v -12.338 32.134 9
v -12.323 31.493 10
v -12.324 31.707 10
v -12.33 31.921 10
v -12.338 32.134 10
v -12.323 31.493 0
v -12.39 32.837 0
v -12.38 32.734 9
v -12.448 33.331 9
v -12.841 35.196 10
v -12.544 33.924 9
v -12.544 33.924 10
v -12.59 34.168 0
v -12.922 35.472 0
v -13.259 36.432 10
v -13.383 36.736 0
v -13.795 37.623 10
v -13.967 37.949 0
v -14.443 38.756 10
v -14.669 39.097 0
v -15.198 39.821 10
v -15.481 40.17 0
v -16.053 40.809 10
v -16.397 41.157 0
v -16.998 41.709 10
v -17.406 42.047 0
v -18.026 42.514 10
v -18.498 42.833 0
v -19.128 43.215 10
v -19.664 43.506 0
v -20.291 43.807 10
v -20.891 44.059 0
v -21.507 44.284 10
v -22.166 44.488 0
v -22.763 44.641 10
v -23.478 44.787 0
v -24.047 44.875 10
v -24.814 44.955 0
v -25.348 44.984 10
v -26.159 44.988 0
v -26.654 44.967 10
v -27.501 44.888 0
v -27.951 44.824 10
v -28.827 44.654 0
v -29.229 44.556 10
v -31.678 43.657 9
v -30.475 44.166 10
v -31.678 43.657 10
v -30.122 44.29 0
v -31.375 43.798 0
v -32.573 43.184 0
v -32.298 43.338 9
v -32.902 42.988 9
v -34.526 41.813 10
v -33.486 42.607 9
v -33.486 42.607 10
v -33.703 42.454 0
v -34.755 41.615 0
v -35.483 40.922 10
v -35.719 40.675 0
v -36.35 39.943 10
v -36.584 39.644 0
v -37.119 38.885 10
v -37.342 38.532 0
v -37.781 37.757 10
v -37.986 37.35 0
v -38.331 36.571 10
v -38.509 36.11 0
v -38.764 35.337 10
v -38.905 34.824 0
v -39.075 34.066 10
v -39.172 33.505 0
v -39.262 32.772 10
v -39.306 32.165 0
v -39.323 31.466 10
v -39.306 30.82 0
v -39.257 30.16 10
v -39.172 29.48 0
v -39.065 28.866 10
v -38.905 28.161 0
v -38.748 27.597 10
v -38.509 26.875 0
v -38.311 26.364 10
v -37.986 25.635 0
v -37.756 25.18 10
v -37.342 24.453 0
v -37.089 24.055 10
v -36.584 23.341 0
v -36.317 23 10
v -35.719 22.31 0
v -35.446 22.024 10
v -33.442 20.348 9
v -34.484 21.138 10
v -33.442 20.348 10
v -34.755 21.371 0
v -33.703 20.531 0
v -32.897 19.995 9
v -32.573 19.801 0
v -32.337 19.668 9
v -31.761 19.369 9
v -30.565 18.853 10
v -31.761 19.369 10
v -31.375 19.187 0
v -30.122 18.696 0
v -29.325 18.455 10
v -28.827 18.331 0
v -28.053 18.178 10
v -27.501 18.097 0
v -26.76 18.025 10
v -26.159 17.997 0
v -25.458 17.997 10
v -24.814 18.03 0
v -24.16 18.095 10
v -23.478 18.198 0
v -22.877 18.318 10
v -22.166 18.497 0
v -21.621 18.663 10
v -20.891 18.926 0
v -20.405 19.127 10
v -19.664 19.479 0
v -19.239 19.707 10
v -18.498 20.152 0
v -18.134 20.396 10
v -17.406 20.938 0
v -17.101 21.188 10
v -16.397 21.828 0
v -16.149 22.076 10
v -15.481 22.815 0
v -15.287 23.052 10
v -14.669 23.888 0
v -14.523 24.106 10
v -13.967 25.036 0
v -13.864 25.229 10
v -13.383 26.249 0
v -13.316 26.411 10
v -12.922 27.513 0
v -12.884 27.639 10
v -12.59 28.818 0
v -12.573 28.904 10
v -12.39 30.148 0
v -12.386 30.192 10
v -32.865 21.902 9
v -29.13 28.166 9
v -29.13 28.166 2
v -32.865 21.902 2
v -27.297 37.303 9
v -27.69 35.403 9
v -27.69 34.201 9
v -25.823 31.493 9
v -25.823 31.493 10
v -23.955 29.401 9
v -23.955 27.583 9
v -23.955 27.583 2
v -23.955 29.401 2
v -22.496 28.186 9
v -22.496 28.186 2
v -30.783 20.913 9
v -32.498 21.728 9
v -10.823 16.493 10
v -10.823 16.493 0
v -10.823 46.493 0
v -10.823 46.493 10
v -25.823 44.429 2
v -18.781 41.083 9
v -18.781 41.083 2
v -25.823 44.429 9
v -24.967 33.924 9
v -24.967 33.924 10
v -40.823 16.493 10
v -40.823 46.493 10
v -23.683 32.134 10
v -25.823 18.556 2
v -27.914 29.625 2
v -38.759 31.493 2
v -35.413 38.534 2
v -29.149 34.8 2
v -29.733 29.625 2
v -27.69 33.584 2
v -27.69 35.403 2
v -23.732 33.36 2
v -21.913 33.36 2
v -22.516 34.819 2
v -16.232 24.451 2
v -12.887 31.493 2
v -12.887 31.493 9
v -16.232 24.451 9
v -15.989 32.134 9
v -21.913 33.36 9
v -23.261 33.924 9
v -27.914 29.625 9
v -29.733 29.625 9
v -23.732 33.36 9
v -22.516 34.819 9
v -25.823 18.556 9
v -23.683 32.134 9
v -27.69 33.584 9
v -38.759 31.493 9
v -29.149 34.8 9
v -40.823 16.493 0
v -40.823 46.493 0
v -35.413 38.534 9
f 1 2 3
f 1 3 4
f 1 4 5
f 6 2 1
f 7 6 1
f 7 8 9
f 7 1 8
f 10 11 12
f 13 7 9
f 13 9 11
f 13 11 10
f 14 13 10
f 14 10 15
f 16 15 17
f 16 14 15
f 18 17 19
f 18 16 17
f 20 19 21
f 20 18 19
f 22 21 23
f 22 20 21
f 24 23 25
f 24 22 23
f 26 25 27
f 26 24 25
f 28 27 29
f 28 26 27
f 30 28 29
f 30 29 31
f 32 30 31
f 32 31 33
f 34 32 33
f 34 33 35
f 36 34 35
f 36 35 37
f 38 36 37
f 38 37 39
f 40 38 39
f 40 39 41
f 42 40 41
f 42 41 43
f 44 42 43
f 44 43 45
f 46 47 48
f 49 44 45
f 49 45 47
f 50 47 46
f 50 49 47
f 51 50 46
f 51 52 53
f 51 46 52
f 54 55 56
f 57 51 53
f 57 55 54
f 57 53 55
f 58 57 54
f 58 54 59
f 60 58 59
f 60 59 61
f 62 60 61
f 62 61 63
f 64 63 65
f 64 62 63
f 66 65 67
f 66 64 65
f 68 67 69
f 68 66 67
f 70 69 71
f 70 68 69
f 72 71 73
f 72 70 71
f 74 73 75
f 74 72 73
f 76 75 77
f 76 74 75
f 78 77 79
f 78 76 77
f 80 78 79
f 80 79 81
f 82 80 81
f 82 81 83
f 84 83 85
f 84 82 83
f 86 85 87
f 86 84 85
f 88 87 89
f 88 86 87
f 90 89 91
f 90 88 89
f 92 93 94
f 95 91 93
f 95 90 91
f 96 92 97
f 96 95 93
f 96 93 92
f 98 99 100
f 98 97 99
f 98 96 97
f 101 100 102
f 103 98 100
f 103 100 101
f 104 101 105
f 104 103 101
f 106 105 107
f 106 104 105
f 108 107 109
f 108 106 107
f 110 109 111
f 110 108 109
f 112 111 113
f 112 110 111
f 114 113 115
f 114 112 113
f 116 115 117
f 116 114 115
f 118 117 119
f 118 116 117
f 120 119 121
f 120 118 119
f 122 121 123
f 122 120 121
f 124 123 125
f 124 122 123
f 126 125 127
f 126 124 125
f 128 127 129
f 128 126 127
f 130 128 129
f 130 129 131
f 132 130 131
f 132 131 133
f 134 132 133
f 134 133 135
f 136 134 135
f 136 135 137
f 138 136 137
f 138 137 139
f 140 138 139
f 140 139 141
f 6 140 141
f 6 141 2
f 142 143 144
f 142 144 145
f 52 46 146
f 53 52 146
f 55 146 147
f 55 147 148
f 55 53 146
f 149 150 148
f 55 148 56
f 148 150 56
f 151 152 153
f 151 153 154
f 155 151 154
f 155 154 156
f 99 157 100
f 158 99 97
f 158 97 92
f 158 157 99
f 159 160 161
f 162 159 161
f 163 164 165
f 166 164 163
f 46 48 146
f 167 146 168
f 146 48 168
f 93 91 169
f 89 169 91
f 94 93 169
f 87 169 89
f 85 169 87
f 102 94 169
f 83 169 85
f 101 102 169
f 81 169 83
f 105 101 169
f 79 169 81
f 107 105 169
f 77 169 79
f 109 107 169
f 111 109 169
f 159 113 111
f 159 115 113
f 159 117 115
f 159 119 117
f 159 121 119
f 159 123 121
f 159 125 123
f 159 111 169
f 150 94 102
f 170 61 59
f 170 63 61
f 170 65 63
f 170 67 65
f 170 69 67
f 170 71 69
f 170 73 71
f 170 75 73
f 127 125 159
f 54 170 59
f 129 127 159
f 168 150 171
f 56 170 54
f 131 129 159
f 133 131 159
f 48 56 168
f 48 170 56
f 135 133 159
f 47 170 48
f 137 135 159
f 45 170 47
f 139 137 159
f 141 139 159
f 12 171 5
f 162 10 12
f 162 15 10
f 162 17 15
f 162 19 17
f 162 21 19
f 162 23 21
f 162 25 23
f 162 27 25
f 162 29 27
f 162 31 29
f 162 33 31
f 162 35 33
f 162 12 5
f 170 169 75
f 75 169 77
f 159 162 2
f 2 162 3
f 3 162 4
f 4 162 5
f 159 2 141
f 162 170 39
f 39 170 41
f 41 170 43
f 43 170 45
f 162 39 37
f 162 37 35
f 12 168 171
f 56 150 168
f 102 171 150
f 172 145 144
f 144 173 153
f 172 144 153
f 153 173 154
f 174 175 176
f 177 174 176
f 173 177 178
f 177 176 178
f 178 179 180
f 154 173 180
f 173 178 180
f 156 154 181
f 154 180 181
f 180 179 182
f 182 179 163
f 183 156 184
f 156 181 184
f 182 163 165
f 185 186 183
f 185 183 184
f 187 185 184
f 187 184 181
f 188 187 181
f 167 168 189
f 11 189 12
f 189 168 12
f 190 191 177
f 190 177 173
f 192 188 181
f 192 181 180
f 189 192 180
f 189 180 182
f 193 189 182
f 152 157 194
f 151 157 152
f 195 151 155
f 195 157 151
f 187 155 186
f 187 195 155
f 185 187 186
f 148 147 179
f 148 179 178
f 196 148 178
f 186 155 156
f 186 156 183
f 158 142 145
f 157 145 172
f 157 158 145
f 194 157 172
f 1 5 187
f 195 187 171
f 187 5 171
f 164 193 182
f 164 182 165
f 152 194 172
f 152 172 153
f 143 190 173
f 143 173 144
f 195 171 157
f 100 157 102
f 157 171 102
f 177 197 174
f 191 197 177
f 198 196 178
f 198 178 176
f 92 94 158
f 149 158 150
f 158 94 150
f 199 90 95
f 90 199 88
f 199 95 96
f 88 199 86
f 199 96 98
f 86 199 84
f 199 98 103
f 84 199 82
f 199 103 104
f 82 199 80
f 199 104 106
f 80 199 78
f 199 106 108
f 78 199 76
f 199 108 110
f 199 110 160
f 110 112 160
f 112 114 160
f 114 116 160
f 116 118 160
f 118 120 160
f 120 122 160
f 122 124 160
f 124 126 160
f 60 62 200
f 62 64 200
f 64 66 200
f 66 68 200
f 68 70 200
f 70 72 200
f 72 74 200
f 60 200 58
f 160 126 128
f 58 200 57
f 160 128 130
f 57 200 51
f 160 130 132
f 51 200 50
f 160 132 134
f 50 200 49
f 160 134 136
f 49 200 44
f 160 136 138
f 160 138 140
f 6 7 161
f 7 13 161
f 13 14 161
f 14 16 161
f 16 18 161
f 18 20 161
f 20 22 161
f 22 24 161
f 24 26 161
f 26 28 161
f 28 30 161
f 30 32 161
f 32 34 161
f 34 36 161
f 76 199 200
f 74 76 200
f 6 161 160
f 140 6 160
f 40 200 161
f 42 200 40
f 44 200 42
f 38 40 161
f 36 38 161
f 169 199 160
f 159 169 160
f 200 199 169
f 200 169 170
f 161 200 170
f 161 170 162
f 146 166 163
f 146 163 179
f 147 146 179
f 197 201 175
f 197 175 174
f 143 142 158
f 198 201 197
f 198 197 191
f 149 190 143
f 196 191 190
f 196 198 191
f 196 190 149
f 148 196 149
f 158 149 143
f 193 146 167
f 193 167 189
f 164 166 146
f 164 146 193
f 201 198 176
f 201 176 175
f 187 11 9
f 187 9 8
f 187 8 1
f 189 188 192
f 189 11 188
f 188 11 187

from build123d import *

# Parameters (mm, degrees)
SKETCH_1_W      = 30
SKETCH_1_H      = 30
SKETCH_1_R      = 13.5
EXTRUDE_1_DEPTH = 10
EXTRUDE_2_DEPTH = 1
EXTRUDE_3_DEPTH = 7


with BuildPart() as part:
    # 草图1 → 凸台-拉伸1 (new body)
    with BuildSketch(Plane.XY):
        with Locations((-25.822727996, 31.492551329)):
            Rectangle(SKETCH_1_W, SKETCH_1_H)
        with Locations((-25.822727996, 31.492551329)):
            Circle(SKETCH_1_R, mode=Mode.SUBTRACT)
    extrude(amount=EXTRUDE_1_DEPTH)

    # 草图2 → 凸台-拉伸2 (add)
    with BuildSketch(Plane.XY.offset(10)):
        Polygon((-32.397789449, 44.701032769), (-24.966802837, 33.924156896), (-11.116377527, 33.924156896), (-11.116377527, 32.134495199), (-23.682915097, 32.134495199), (-32.397789449, 18.361881267), (-34.074436385, 19.422810401), (-25.822727996, 31.492551329), (-34.373088606, 43.892812528), (-32.550272533, 45.149700145), align=None)
    extrude(amount=-EXTRUDE_2_DEPTH)

    # 草图3 → 凸台-拉伸3 (add)
    with BuildSketch(Plane(origin=(0, 0, 9), x_dir=(-1, 0, 0), z_dir=(0, 0, -1))):
        Polygon((22.515744425, 34.818987745), (18.780798274, 41.082803685), (25.822727996, 44.428692946), (27.690201072, 35.402573081), (27.690201072, 33.583732117), (29.149164412, 34.7995349), (35.412980353, 38.534481051), (38.758869613, 31.492551329), (29.732749748, 29.625078253), (27.913908784, 29.625078253), (29.129711567, 28.166114913), (32.864657718, 21.902298973), (25.822727996, 18.556409712), (23.955254921, 27.582529577), (23.955254921, 29.401370541), (22.49629158, 28.185567758), (16.23247564, 24.450621607), (12.886586379, 31.492551329), (21.912706244, 33.360024404), (23.731547209, 33.360024404), align=None)
    extrude(amount=EXTRUDE_3_DEPTH)


solid = part.part
